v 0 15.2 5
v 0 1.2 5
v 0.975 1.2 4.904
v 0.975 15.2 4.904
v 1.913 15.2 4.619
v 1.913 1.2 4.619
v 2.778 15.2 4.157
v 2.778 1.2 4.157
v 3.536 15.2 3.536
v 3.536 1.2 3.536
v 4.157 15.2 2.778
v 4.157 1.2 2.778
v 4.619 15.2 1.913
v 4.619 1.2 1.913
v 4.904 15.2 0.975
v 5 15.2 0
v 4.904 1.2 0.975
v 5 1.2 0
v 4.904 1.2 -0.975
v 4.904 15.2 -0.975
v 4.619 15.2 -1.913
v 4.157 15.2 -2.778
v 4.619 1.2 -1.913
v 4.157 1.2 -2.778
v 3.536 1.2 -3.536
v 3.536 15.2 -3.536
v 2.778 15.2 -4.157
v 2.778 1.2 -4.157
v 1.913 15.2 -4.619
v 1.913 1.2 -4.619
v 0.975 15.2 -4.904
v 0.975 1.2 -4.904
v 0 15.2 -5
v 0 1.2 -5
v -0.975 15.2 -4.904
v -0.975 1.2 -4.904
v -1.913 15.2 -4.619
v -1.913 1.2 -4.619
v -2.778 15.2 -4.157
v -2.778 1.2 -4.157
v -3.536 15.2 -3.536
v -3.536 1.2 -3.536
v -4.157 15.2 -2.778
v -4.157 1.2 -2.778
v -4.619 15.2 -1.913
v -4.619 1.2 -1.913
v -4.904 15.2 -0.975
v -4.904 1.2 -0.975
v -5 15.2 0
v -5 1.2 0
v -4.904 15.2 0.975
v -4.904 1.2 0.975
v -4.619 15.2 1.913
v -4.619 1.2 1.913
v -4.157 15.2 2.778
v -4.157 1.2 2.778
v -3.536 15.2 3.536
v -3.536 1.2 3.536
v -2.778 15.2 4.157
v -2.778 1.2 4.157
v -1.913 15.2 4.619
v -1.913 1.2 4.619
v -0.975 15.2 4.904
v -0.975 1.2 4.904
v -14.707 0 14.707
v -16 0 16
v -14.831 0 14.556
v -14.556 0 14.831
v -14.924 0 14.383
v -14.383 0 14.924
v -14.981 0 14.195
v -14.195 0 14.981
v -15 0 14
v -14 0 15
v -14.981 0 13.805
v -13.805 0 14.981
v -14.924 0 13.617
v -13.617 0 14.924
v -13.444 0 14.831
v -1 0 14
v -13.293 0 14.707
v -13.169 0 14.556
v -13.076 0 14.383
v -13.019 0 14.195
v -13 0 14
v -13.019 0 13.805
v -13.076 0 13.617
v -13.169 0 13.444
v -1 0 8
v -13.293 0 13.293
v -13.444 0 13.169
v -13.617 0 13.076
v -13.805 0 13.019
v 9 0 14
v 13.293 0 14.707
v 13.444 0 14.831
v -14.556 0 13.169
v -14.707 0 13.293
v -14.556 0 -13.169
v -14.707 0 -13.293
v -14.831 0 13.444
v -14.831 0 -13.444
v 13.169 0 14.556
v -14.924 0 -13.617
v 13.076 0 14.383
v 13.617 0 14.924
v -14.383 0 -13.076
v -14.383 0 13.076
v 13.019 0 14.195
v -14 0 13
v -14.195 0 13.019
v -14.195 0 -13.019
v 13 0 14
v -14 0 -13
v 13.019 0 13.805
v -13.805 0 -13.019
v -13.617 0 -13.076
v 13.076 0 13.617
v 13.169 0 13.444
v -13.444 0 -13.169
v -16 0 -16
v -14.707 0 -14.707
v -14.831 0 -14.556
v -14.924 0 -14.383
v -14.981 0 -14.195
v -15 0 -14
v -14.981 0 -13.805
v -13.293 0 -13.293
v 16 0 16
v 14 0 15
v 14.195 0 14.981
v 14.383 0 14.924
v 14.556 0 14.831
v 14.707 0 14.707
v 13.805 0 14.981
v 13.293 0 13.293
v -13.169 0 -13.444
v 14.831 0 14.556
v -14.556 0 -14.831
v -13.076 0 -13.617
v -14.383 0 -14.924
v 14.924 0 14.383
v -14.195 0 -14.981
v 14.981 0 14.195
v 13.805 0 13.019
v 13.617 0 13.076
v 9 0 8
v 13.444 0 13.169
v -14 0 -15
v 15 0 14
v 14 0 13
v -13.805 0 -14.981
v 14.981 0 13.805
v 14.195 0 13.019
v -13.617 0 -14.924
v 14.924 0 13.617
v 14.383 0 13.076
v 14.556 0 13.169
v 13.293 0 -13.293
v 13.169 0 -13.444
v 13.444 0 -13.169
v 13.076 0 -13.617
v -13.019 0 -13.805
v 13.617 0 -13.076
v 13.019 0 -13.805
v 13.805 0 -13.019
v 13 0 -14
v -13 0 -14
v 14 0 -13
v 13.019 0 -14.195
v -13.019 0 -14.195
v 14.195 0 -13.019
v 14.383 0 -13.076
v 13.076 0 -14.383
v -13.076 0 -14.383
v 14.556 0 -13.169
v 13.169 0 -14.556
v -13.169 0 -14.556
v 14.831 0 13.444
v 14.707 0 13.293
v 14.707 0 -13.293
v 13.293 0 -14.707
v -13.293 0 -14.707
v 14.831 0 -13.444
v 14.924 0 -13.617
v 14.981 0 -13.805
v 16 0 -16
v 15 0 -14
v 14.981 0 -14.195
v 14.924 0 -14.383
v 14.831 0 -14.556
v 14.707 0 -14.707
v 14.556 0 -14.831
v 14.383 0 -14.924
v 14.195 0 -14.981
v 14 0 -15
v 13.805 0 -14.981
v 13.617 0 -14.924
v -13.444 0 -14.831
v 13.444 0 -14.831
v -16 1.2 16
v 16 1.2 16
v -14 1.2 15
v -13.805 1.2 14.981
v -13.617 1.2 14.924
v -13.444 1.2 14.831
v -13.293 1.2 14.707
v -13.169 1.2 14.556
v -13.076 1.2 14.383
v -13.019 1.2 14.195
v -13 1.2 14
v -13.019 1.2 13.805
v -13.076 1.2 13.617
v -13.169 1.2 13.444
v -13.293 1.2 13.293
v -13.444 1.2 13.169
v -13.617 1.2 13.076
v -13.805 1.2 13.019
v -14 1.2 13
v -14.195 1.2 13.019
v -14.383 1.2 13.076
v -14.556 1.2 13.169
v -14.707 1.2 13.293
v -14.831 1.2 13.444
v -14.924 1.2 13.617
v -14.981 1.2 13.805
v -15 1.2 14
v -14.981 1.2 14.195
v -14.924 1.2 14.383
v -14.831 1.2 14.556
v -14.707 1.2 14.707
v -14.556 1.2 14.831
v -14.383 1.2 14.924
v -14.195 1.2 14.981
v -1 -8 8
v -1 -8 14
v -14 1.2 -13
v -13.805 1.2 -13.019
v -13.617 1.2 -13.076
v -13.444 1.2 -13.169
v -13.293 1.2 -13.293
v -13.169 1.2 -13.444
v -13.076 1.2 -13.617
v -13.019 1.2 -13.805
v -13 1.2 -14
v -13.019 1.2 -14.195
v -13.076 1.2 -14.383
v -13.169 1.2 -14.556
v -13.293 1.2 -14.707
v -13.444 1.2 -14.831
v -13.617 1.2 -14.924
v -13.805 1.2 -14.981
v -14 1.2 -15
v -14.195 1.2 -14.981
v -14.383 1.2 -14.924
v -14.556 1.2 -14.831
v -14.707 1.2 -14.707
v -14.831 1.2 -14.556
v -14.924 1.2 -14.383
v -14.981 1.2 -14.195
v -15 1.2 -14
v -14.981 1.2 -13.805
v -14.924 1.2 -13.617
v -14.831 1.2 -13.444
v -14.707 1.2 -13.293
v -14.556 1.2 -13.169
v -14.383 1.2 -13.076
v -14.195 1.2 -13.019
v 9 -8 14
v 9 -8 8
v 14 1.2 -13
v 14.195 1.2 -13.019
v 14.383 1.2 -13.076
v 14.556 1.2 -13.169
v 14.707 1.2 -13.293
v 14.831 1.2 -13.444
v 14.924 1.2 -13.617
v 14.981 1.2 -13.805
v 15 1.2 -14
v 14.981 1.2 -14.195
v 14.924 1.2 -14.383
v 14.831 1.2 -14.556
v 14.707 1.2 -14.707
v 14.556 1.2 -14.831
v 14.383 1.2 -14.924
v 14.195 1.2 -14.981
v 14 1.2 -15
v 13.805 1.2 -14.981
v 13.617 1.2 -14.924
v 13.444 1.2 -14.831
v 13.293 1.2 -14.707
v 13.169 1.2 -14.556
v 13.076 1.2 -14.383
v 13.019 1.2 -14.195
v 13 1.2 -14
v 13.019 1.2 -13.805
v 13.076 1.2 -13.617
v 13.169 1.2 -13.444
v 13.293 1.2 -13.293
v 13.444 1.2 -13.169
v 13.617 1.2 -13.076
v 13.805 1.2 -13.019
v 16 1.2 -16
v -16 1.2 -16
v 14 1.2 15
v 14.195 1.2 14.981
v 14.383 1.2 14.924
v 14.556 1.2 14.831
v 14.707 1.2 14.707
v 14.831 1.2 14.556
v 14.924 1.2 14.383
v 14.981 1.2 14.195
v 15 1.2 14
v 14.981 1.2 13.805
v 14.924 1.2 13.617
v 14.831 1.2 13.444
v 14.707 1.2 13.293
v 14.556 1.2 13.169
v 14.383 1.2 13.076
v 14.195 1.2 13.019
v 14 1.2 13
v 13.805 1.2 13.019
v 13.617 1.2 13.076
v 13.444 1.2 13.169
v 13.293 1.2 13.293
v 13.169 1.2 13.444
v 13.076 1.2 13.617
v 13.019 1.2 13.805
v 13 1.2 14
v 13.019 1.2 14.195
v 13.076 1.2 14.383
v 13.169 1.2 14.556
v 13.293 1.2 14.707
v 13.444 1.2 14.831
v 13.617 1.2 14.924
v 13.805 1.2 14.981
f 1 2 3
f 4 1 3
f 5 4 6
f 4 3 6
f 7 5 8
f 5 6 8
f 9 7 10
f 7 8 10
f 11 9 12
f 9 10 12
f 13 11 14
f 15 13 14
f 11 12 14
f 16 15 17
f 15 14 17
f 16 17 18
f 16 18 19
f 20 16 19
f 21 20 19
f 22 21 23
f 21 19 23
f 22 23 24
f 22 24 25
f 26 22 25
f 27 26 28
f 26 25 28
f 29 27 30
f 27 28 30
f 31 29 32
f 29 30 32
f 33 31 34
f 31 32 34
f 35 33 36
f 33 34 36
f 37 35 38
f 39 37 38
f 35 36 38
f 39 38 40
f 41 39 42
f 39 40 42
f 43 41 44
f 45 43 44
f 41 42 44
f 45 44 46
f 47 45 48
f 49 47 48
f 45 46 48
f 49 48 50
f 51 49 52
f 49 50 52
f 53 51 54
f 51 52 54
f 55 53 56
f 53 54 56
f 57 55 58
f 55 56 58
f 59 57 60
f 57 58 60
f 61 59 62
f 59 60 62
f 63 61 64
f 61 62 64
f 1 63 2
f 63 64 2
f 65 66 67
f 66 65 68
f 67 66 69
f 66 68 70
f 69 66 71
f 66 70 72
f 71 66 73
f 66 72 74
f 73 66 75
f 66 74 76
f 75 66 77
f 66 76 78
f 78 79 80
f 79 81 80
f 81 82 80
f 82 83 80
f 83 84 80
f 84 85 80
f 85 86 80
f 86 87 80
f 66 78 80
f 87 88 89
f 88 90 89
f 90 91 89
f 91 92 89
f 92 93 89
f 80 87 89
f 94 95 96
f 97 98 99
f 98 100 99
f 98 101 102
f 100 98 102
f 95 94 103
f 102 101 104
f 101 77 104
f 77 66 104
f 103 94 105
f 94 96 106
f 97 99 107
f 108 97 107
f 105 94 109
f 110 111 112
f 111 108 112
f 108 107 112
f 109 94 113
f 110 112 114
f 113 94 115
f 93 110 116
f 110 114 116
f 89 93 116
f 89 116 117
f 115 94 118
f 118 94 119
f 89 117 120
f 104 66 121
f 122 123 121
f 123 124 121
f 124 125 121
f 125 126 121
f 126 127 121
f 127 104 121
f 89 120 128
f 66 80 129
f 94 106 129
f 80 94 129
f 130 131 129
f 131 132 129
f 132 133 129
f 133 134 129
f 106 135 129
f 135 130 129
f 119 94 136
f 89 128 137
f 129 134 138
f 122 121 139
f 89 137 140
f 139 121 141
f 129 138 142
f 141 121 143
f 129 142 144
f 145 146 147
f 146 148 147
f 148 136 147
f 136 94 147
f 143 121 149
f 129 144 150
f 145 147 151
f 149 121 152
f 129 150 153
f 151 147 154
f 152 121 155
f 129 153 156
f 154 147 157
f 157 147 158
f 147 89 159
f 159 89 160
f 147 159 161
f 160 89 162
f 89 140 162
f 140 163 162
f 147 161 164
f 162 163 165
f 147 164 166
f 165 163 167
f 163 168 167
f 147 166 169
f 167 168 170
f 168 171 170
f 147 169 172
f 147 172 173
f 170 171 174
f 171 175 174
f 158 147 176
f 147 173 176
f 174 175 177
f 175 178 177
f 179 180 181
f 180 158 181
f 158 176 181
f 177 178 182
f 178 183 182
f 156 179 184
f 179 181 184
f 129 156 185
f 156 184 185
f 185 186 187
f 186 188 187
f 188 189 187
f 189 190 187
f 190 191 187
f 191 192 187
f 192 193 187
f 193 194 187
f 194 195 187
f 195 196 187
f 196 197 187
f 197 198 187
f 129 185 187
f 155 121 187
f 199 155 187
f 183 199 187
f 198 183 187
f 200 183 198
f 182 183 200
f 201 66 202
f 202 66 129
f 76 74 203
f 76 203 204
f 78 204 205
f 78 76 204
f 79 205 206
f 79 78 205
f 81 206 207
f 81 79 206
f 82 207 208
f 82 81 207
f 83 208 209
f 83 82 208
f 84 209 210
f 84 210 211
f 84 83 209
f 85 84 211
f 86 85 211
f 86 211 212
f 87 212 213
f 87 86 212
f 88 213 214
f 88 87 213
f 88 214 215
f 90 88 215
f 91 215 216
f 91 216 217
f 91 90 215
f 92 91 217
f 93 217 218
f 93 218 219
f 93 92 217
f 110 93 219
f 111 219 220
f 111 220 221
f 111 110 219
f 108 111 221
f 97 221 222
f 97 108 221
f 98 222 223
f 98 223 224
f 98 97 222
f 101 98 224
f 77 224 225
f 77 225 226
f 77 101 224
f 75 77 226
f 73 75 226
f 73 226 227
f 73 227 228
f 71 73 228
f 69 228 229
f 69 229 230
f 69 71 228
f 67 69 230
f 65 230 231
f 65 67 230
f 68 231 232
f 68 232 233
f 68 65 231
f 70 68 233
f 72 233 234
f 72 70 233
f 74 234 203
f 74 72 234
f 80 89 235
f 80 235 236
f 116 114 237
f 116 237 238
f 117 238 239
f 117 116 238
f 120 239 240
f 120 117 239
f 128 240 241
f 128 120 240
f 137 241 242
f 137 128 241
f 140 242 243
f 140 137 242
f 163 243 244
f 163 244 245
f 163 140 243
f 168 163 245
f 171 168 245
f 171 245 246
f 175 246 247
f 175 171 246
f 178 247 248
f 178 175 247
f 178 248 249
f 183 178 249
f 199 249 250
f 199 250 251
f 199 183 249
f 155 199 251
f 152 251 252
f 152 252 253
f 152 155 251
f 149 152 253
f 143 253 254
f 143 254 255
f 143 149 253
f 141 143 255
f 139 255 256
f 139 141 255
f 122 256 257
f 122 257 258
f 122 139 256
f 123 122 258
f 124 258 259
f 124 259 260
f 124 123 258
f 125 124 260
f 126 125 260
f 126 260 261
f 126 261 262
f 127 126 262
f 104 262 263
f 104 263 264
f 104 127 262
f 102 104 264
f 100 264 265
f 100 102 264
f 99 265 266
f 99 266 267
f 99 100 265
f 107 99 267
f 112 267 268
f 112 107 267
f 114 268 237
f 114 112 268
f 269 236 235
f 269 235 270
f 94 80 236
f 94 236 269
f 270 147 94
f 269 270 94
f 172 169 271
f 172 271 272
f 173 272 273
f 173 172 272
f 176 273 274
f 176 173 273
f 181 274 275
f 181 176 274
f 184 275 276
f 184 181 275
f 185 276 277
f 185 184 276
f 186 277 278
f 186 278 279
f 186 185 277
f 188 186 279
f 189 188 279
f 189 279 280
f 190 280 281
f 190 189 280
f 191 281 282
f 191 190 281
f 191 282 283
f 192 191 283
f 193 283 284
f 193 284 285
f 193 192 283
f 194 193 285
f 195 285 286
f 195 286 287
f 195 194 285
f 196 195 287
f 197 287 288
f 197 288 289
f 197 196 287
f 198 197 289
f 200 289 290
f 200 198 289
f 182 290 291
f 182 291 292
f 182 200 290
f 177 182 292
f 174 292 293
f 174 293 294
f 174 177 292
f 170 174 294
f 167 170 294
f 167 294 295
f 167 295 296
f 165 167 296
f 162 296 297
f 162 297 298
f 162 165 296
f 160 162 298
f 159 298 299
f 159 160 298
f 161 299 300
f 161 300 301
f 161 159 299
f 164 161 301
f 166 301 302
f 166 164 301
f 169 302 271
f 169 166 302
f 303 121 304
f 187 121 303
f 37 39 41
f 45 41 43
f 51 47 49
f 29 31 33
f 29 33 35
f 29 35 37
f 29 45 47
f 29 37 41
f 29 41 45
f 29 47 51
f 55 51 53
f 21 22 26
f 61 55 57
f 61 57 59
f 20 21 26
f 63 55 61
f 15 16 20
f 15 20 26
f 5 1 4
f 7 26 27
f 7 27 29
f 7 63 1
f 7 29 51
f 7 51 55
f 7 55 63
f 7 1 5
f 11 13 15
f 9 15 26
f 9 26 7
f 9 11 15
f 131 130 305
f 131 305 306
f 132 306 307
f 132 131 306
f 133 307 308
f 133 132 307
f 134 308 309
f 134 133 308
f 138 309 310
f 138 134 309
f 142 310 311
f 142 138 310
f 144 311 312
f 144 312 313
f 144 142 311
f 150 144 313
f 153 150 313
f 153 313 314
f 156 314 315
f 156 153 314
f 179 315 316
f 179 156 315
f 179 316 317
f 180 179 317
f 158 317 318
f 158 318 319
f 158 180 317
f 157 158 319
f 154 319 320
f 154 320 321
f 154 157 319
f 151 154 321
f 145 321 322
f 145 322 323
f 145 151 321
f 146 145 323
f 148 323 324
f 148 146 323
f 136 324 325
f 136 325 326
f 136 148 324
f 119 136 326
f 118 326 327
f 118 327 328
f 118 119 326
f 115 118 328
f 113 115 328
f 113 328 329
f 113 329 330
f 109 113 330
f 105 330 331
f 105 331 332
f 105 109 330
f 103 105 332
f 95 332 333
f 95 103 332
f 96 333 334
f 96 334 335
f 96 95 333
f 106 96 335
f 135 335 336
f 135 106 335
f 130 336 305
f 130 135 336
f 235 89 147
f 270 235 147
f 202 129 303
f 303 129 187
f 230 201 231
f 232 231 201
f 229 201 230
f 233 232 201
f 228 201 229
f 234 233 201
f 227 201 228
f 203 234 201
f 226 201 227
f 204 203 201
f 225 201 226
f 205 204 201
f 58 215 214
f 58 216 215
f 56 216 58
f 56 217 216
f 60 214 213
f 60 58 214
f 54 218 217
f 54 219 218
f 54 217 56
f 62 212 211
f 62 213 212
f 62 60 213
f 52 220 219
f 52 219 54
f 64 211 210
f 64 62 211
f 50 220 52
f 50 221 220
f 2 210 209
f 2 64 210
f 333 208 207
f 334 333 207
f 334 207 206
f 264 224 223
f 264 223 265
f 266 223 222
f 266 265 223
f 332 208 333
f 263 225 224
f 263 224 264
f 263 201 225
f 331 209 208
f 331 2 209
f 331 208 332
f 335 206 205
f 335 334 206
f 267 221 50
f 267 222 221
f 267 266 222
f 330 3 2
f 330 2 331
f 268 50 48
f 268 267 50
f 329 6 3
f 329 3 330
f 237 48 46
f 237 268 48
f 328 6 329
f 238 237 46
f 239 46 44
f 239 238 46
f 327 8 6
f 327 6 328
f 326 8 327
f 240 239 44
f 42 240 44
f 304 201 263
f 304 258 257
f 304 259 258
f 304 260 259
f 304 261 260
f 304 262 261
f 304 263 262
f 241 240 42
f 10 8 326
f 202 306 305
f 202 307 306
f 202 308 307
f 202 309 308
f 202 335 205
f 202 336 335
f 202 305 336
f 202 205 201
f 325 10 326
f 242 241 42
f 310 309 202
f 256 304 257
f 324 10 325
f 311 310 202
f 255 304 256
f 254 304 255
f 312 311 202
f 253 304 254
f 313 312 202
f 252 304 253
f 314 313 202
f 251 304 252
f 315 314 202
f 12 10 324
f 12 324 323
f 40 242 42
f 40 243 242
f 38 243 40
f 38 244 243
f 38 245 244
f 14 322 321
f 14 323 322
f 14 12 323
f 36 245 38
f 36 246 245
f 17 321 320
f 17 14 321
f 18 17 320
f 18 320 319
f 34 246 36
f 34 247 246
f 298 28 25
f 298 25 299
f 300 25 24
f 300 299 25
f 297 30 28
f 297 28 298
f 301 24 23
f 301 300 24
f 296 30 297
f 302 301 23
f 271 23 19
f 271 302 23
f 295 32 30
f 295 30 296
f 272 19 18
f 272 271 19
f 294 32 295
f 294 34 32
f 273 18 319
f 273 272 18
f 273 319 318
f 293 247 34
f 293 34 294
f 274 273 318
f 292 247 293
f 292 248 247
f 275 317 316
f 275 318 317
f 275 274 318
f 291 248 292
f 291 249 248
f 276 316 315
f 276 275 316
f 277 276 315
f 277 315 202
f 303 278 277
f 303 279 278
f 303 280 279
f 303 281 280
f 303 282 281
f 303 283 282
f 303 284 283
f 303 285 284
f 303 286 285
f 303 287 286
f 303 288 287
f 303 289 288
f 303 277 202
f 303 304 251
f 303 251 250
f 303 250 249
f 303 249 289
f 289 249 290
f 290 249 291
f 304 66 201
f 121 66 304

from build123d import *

# Parameters (mm, degrees)
SKETCH1_W           = 32
SKETCH1_H           = 32
SKETCH1_R           = 1
BOSS_EXTRUDE1_DEPTH = 1.2
SKETCH2_R           = 5
BOSS_EXTRUDE2_DEPTH = 14
SKETCH3_W           = 10
SKETCH3_H           = 6
BOSS_EXTRUDE3_DEPTH = 8


with BuildPart() as part:
    # Sketch1 → Boss-Extrude1 (new body)
    with BuildSketch(Plane(origin=(0, 0, 0), x_dir=(1, 0, 0), z_dir=(0, 1, 0))):
        Rectangle(SKETCH1_W, SKETCH1_H)
        with Locations(Location((-14, 14, 0), (0, 0, 270))):
            Circle(SKETCH1_R, mode=Mode.SUBTRACT)
        with Locations(Location((14, 14, 0), (0, 0, 270))):
            Circle(SKETCH1_R, mode=Mode.SUBTRACT)
        with Locations(Location((14, -14, 0), (0, 0, 270))):
            Circle(SKETCH1_R, mode=Mode.SUBTRACT)
        with Locations(Location((-14, -14, 0), (0, 0, 270))):
            Circle(SKETCH1_R, mode=Mode.SUBTRACT)
    extrude(amount=BOSS_EXTRUDE1_DEPTH)

    # Sketch2 → Boss-Extrude2 (add)
    with BuildSketch(Plane(origin=(0, 1.2, 0), x_dir=(1, 0, 0), z_dir=(0, 1, 0))):
        with Locations(Location((0, 0, 0), (0, 0, 270))):
            Circle(SKETCH2_R)
    extrude(amount=BOSS_EXTRUDE2_DEPTH)

    # Sketch3 → Boss-Extrude3 (add)
    with BuildSketch(Plane.XZ):
        with Locations((4, 11)):
            Rectangle(SKETCH3_W, SKETCH3_H)
    extrude(amount=BOSS_EXTRUDE3_DEPTH)


solid = part.part
